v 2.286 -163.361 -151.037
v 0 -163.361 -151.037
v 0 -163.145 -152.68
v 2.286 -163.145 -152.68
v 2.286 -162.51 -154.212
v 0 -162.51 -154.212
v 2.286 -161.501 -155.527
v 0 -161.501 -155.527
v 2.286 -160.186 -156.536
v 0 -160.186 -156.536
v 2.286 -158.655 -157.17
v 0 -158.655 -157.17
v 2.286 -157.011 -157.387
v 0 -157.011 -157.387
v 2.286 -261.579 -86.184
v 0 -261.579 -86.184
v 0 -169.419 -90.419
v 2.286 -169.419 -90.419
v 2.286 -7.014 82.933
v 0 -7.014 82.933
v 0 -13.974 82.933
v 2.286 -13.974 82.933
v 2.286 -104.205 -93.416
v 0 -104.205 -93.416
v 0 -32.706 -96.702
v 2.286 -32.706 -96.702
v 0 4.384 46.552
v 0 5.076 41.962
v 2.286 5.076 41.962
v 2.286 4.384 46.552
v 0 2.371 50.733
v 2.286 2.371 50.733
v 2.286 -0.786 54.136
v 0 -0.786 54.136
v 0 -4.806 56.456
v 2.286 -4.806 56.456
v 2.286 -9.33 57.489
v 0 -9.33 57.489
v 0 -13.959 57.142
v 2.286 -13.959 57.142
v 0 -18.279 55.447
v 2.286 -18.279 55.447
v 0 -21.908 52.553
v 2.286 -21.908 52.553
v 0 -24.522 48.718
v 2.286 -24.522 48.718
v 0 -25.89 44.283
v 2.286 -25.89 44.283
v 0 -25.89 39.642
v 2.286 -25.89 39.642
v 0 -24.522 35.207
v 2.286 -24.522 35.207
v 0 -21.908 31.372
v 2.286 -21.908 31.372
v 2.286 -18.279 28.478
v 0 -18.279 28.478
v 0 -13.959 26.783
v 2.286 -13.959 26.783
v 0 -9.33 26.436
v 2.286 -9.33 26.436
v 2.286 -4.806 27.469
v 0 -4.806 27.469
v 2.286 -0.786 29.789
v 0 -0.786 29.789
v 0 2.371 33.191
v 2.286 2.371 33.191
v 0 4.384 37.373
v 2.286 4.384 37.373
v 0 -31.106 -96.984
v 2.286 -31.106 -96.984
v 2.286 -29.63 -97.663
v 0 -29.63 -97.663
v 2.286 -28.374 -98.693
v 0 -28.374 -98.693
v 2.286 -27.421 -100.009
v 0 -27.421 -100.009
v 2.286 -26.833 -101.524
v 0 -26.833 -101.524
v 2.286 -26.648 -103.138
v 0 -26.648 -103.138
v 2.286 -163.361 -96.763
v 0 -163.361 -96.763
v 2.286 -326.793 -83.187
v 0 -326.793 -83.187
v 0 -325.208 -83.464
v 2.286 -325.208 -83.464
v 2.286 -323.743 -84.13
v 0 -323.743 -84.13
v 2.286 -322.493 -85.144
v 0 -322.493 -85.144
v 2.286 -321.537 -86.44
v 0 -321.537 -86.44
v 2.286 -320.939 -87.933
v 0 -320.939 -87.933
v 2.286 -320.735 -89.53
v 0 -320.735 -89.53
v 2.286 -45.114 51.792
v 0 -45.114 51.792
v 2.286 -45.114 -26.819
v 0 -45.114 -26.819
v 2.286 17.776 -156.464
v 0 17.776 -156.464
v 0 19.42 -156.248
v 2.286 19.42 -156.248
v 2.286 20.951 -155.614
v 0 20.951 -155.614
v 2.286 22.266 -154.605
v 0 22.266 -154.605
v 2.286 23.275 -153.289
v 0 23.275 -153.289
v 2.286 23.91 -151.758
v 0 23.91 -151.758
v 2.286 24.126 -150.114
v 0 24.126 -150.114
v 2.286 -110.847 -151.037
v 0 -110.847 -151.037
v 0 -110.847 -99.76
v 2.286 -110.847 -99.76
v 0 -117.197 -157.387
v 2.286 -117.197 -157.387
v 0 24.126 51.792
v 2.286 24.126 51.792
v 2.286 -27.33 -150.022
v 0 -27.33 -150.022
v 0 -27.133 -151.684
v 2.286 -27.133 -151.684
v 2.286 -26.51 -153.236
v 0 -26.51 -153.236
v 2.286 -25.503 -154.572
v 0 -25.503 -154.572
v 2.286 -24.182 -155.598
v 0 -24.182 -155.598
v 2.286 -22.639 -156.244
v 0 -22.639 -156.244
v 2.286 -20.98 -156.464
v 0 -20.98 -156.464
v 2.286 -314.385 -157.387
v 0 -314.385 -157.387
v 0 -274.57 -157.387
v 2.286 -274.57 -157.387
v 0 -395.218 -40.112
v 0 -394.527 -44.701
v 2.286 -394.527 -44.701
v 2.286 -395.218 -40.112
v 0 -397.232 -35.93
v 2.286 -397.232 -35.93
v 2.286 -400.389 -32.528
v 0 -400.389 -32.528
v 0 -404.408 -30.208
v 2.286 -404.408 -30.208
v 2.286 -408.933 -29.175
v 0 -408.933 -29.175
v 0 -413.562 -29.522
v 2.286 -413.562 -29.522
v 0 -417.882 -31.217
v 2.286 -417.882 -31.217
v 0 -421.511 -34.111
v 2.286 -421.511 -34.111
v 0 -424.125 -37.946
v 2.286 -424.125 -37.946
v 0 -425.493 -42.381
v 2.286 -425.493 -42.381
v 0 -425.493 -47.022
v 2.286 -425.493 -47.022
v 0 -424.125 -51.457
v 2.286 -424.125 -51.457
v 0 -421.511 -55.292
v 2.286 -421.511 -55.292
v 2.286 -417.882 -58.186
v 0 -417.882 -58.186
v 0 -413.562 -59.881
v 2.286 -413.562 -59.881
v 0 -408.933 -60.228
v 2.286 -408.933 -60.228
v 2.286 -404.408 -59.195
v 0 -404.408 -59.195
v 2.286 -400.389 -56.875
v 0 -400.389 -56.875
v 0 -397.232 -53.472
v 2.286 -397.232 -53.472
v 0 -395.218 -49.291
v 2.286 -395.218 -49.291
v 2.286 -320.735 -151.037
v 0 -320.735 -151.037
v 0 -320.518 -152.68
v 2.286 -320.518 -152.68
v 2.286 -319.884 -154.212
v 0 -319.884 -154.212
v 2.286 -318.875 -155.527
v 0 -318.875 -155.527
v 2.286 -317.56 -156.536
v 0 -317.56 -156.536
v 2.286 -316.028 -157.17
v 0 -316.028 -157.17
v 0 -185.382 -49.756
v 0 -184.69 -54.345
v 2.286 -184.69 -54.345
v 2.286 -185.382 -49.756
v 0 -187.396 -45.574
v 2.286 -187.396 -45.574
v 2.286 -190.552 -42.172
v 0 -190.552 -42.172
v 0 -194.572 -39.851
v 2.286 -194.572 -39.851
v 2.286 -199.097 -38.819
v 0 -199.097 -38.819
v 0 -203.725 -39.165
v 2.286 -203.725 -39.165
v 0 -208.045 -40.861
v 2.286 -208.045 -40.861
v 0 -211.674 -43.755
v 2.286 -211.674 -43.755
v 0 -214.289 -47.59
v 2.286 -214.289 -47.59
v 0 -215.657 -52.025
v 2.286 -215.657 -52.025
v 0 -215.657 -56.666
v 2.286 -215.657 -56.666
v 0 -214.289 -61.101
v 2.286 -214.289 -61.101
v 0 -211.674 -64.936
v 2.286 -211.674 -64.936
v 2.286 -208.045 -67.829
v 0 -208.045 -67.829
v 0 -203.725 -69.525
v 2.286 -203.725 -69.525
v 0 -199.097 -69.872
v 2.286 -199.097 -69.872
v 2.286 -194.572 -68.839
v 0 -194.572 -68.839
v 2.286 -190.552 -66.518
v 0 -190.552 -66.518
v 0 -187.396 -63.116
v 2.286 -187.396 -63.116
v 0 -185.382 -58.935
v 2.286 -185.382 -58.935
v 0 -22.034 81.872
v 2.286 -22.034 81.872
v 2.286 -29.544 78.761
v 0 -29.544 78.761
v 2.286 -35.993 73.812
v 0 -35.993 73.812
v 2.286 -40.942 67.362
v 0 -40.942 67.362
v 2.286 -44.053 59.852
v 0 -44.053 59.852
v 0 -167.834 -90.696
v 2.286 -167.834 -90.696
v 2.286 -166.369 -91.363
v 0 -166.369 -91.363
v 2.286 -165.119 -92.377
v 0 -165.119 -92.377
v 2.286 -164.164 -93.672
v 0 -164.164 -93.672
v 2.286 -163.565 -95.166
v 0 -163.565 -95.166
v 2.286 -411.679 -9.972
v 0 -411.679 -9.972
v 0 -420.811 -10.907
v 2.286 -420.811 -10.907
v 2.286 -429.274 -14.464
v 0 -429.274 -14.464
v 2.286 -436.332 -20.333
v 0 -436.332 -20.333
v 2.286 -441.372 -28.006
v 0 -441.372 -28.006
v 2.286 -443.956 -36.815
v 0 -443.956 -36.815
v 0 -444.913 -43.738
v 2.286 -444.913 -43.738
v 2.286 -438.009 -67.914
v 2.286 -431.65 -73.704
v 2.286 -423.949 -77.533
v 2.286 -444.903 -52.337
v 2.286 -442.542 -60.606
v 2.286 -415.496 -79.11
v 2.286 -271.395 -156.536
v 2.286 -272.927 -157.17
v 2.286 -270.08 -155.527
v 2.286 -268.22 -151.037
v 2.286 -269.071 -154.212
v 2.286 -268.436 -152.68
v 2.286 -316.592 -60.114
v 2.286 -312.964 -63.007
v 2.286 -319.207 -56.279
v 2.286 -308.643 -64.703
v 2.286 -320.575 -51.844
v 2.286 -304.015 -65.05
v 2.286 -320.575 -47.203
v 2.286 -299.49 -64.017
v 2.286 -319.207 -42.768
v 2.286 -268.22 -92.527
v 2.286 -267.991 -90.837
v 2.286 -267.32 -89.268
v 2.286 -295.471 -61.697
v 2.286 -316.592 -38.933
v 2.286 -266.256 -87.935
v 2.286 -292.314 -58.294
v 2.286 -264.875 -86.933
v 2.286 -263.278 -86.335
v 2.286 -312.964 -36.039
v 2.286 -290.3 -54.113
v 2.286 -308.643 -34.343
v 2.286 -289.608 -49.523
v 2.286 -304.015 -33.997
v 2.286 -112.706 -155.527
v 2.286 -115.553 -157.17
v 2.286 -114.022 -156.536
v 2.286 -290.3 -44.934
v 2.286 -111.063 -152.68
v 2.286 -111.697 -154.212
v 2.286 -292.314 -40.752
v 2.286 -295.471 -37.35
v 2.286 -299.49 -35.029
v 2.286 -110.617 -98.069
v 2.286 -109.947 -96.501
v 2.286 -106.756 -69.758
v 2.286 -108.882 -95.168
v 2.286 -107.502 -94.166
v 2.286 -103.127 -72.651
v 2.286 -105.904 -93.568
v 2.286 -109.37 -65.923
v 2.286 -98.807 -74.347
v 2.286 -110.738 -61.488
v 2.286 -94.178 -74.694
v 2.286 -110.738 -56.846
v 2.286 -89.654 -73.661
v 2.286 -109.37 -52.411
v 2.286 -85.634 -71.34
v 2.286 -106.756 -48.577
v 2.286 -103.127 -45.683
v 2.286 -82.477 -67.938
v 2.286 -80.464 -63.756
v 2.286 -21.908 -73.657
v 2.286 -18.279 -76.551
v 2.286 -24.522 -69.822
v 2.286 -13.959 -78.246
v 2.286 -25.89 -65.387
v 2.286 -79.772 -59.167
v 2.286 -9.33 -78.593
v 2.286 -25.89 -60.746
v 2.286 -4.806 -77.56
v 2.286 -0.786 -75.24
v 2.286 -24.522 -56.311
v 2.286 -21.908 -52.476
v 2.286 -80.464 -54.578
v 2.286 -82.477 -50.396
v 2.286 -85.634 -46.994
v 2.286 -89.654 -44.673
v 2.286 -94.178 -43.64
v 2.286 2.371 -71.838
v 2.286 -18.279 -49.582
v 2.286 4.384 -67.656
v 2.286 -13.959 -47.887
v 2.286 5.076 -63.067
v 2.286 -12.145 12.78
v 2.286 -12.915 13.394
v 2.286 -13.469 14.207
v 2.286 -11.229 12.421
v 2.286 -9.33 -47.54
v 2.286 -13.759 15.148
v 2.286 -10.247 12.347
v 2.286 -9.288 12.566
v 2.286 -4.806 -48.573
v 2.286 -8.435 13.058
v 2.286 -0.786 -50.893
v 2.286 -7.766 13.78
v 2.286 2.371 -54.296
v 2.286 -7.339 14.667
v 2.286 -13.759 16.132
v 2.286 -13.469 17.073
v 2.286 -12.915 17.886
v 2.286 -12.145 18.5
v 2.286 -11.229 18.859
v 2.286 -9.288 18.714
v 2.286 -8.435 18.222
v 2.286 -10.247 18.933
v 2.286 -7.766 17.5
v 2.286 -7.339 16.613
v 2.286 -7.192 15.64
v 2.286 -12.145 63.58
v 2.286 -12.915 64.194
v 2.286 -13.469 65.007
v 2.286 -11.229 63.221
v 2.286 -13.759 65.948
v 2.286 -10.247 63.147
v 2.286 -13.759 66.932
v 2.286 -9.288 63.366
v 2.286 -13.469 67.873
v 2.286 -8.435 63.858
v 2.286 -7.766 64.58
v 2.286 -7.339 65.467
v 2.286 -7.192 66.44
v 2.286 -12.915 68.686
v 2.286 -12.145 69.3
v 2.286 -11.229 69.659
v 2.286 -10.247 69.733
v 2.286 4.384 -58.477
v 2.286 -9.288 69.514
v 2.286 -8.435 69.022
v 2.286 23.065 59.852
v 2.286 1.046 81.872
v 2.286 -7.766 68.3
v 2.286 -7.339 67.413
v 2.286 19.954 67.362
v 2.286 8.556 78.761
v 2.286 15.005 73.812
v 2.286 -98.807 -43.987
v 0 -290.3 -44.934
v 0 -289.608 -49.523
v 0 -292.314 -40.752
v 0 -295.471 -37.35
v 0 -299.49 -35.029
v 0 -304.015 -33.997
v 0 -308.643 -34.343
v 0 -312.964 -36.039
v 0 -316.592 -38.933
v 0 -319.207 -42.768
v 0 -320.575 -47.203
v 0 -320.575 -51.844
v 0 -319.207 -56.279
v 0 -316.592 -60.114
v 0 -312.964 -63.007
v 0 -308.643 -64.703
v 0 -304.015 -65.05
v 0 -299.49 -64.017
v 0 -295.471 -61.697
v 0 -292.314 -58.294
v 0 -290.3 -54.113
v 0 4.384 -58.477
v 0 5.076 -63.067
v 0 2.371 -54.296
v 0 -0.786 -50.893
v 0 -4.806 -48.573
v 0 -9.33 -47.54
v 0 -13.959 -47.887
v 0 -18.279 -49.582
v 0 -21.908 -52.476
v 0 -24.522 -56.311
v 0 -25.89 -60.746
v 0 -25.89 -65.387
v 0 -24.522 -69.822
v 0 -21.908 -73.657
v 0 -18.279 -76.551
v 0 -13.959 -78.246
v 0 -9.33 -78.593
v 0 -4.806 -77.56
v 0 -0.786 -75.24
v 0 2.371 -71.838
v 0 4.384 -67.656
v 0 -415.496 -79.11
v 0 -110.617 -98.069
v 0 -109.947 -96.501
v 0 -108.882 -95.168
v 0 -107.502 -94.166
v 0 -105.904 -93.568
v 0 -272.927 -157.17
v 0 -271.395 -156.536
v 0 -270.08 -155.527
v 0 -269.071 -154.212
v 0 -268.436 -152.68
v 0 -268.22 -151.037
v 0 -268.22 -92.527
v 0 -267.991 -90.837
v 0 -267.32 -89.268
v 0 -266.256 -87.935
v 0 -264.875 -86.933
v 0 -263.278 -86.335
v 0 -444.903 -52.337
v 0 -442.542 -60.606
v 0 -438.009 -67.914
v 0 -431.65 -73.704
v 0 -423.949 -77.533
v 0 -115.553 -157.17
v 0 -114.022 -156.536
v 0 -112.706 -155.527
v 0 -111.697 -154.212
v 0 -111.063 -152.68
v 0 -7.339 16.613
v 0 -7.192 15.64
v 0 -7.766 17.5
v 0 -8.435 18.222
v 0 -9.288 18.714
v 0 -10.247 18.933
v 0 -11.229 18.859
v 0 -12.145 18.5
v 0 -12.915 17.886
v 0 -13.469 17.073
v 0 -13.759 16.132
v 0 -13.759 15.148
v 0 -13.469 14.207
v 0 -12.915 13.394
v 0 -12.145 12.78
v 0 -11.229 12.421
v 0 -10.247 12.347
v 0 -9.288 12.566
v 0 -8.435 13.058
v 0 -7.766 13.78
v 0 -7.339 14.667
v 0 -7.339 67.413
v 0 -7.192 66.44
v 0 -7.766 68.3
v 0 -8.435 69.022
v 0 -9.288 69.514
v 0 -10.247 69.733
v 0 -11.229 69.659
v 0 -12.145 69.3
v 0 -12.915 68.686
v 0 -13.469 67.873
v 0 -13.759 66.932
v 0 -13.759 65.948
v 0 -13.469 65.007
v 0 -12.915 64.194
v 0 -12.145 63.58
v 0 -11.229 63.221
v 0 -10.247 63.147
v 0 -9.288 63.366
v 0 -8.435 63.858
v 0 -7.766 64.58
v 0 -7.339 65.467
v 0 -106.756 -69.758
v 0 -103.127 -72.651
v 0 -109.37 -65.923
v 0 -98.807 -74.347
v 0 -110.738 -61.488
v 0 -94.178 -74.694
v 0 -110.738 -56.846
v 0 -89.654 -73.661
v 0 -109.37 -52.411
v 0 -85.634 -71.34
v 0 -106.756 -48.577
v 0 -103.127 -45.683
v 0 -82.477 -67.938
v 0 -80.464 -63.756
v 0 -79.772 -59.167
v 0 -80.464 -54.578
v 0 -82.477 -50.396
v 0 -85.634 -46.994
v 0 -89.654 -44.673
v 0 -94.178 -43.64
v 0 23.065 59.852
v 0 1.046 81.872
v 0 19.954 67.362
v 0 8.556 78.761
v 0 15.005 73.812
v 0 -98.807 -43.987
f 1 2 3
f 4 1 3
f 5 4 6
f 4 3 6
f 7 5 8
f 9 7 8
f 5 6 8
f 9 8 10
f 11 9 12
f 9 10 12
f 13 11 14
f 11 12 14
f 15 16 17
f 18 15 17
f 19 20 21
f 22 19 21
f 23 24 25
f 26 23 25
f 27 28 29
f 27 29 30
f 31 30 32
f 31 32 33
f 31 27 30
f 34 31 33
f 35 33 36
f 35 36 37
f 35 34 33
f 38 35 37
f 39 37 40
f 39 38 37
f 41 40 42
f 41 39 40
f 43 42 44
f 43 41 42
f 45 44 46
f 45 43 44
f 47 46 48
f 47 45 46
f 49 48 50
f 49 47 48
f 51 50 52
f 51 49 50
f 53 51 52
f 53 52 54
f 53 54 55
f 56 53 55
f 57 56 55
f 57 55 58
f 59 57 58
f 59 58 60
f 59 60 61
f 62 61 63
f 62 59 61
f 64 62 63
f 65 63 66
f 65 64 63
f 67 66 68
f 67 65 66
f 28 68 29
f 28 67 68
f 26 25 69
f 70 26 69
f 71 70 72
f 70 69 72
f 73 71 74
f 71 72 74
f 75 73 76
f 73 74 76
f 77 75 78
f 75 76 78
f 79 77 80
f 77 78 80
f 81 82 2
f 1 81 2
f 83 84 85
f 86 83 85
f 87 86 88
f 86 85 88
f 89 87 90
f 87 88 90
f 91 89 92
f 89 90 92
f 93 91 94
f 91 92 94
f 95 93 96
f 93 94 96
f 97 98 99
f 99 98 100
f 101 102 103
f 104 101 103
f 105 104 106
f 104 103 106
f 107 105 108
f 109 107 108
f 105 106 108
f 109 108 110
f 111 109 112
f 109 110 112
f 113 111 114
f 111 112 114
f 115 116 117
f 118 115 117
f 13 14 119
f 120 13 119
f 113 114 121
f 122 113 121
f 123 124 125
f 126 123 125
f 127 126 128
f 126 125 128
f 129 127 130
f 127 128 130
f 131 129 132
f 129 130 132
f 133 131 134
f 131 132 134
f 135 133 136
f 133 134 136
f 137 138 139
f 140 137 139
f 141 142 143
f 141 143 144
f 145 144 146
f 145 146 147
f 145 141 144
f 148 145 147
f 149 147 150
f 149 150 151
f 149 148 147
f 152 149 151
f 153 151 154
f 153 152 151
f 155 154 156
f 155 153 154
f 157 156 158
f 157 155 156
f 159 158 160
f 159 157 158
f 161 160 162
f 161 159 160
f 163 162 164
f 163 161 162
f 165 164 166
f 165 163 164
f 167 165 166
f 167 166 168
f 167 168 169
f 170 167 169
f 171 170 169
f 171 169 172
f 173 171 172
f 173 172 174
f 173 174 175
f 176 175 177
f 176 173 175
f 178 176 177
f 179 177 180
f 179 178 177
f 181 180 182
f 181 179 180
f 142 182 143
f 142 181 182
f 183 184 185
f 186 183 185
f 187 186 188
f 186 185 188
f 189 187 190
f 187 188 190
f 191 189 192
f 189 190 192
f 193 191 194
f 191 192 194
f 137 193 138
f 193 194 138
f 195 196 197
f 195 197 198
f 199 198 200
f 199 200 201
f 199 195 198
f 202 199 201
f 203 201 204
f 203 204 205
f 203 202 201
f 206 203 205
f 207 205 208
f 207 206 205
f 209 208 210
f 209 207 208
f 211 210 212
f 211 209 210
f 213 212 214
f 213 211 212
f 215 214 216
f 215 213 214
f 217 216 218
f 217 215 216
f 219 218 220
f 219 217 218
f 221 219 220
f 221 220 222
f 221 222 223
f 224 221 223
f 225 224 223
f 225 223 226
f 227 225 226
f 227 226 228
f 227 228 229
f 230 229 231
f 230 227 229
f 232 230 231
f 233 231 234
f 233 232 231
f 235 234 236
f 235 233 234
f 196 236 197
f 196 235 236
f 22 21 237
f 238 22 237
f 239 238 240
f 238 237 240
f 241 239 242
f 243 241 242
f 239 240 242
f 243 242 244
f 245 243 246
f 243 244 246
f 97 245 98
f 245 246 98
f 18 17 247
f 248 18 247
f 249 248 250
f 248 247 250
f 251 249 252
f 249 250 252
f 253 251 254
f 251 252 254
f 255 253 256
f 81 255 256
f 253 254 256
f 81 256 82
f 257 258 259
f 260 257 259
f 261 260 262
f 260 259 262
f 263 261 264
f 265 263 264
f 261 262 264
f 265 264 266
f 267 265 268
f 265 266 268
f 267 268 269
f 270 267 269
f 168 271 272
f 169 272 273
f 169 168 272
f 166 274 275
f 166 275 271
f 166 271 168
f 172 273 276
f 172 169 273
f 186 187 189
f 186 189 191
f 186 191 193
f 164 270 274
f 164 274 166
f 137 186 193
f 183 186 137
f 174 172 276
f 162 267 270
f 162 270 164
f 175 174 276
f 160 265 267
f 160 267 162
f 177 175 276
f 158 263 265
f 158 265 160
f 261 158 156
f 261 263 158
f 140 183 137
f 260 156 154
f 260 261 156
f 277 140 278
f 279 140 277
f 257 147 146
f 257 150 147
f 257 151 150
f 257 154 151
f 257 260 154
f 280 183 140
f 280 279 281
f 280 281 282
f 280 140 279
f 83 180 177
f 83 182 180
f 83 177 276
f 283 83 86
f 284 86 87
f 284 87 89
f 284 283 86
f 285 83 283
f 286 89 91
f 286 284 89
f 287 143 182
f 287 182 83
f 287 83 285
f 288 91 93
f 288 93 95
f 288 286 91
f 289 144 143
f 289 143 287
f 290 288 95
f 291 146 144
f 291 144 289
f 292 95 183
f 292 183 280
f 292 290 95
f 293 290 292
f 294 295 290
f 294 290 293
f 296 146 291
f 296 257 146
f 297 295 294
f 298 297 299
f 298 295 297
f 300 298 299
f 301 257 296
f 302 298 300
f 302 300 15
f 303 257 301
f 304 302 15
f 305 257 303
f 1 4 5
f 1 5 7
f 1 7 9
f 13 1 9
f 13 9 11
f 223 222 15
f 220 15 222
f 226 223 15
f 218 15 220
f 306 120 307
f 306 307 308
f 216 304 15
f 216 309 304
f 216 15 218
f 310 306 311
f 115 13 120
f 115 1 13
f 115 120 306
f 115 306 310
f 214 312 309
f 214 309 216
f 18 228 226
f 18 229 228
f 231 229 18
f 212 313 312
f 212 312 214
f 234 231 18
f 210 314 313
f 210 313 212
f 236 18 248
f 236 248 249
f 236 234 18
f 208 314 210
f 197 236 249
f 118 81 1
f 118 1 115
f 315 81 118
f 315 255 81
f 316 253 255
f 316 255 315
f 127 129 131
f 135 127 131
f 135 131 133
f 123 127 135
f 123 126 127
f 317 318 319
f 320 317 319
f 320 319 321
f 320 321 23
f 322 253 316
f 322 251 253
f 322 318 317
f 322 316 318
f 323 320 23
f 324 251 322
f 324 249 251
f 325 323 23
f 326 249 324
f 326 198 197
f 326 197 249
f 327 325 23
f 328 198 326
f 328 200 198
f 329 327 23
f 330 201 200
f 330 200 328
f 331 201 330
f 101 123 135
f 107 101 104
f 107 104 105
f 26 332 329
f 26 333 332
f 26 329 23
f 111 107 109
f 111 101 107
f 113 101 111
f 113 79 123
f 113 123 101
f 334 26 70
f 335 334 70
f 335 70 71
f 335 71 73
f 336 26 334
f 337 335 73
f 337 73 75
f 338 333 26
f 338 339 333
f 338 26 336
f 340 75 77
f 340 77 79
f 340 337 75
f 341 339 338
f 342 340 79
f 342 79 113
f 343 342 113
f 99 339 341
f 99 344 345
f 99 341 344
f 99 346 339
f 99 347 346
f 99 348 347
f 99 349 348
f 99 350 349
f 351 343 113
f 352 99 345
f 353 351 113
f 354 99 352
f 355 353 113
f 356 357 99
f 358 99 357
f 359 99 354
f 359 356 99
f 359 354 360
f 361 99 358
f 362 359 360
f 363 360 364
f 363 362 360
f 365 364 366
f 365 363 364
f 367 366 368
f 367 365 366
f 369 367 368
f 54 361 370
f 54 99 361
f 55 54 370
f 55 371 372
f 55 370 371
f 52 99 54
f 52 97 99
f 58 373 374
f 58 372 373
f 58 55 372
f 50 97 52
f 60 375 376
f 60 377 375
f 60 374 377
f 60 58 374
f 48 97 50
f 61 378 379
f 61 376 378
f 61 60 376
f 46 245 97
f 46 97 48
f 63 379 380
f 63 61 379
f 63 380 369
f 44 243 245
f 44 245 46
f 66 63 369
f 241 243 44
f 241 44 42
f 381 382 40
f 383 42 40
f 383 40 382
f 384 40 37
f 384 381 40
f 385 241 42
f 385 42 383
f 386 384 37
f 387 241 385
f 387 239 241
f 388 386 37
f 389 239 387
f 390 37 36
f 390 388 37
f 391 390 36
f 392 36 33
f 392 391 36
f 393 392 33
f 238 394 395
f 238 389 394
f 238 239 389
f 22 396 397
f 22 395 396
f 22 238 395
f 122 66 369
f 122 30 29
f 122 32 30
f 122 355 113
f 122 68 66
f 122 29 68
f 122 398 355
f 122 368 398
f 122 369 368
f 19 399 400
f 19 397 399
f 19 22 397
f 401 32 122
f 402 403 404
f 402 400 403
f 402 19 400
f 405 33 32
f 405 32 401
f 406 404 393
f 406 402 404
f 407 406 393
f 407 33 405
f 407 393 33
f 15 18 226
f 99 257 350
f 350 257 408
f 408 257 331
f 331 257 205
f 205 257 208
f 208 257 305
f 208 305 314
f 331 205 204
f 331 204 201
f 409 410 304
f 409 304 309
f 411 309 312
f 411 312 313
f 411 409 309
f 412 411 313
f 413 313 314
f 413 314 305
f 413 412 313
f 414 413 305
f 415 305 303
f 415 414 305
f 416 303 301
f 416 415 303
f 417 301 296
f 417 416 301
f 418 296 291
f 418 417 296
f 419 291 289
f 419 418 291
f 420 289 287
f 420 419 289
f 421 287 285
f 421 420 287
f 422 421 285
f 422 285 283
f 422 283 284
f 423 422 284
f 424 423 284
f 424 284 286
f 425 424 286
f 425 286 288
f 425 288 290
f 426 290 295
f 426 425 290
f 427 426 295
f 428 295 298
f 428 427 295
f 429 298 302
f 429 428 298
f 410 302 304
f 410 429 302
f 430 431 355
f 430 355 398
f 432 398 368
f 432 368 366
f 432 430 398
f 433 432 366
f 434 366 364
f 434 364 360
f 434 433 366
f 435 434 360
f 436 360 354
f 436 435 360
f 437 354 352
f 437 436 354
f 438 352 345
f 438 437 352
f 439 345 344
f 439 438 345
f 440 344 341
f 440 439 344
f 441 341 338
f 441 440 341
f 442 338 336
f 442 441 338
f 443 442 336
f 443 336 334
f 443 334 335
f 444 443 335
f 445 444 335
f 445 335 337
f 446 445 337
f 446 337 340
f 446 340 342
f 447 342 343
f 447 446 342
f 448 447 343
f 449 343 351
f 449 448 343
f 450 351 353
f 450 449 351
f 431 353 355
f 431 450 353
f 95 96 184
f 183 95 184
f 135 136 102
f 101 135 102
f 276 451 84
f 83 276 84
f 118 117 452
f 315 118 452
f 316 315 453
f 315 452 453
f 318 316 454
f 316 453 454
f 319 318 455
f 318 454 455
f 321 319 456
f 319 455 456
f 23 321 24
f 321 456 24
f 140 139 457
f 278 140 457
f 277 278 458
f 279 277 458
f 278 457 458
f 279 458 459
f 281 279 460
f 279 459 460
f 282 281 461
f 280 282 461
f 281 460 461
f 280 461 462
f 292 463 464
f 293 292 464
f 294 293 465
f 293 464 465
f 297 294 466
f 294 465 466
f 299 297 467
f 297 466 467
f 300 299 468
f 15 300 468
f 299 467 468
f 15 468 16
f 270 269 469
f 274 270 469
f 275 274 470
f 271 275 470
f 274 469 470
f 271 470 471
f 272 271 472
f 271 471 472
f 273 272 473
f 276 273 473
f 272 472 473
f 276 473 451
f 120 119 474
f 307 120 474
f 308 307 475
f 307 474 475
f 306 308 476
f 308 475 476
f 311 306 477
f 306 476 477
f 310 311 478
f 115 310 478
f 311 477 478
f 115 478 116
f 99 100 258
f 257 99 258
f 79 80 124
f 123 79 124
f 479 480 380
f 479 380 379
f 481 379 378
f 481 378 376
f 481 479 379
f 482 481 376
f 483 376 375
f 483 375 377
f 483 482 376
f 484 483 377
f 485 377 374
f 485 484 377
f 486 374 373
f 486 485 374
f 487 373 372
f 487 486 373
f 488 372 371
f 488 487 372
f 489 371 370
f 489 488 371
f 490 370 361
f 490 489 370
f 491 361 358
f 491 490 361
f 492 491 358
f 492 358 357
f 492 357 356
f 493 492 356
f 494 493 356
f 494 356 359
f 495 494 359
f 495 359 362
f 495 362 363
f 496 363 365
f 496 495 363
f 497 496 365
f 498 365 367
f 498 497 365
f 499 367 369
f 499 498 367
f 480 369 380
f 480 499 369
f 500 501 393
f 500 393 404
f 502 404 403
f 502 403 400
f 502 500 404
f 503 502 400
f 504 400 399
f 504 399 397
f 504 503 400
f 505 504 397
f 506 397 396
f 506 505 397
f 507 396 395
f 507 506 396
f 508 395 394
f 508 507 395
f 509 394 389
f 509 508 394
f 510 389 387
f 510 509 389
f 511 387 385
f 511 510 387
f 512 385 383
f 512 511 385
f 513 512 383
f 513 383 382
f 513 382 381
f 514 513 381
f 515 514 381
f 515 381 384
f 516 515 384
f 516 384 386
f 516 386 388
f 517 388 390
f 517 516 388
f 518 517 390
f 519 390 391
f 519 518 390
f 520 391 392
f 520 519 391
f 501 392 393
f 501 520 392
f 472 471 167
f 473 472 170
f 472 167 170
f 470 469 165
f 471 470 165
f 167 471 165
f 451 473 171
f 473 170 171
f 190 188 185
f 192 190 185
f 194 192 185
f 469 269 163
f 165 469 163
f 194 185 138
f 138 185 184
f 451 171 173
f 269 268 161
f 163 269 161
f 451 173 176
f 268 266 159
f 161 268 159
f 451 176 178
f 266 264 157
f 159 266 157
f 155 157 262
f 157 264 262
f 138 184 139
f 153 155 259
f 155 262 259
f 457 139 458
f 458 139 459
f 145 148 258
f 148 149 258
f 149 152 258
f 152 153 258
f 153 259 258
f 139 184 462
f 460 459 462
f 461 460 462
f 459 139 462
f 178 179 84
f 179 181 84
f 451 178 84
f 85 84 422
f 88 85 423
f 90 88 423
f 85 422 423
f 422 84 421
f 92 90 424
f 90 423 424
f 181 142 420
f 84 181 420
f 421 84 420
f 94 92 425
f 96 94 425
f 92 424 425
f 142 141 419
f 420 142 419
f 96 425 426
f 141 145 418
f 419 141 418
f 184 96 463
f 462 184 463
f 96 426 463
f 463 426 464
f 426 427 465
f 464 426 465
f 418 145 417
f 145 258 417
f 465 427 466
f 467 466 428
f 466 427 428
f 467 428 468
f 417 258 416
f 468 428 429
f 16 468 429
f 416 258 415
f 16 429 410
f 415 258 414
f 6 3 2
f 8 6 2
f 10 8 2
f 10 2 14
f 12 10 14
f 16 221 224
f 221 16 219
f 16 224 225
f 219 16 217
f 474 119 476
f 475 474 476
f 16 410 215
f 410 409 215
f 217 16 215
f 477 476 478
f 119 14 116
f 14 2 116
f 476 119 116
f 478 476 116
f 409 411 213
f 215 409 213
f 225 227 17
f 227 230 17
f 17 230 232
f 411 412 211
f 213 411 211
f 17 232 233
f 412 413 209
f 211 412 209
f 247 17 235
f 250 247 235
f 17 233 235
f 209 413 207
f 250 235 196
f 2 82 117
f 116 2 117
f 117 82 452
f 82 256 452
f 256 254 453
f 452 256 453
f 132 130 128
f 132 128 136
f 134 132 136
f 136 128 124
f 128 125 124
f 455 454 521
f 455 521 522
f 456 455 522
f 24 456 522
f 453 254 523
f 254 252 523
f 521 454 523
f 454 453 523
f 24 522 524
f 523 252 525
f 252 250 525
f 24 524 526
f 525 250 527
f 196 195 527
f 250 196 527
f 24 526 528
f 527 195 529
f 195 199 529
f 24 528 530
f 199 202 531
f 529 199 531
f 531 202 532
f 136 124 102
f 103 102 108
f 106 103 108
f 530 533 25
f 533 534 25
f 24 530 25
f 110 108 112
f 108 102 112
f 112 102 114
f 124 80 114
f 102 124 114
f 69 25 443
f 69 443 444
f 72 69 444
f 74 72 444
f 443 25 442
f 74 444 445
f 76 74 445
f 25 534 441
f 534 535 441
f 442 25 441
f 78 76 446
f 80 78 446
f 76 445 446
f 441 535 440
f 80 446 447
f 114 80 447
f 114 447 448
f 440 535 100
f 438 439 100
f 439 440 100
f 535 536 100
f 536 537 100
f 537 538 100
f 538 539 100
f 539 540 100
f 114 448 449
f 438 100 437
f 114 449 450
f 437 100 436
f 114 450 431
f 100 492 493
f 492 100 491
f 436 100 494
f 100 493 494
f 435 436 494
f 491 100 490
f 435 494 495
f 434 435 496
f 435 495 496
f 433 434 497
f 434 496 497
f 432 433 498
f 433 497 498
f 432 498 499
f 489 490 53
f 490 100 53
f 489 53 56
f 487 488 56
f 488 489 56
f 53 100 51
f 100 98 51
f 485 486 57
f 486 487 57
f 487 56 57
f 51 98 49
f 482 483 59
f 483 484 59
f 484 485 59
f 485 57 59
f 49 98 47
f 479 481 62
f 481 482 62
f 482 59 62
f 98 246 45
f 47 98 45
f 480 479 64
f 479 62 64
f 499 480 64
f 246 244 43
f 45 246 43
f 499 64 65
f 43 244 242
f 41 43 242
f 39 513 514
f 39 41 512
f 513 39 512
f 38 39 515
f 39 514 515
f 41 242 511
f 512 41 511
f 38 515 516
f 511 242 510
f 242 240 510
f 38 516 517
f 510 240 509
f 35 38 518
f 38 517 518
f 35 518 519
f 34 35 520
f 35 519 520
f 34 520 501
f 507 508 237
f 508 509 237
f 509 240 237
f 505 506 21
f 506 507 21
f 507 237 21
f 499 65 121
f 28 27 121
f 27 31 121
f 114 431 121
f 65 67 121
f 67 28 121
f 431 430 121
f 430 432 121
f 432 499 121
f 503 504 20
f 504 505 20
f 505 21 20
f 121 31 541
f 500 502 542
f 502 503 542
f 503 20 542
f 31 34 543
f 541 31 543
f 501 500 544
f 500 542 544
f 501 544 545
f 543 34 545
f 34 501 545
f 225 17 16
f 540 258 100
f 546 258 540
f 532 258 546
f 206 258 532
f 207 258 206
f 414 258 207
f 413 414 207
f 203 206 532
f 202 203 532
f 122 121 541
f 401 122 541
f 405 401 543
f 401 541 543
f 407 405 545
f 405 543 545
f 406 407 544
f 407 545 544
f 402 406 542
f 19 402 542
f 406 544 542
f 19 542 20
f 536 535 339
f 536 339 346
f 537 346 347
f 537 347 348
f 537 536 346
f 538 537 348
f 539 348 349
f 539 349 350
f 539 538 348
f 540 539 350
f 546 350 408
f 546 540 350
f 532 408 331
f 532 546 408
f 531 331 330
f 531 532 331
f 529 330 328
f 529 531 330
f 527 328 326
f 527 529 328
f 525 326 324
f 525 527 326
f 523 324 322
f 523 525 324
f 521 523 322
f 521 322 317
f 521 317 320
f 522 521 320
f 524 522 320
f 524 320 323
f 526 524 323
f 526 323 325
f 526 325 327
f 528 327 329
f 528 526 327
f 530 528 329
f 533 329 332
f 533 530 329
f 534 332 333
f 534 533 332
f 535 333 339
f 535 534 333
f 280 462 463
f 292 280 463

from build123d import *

# Parameters (mm, degrees)
F0_R     = 15.5702
F0_R_2   = 3.302
F1_DEPTH = 2.286


# Not quite as in the source:
# - a feature names something its author has since deleted; it is built from what else it names


with BuildPart() as f1:
    # F0 (on Right) → F1 (new body)
    with BuildSketch(Plane.YZ):
        with BuildLine():
            Line((-45.1142073236, -26.818738899), (-411.6793204181, -9.9719436831))
            ThreePointArc((-411.6793204181, -9.9719436831), (-433.0208080629, -17.1370033148), (-443.9559804746, -36.8148888401))
            Line((-443.9559804746, -36.8148888401), (-444.9130844184, -43.7378478567))
            ThreePointArc((-444.9130844184, -43.7378478567), (-438.0085876413, -67.9142971029), (-415.4957405146, -79.1100323691))
            Line((-415.4957405146, -79.1100323691), (-326.7930180723, -83.186679455))
            ThreePointArc((-326.7930180723, -83.186679455), (-322.4925045261, -85.1441378233), (-320.7345470438, -89.5299838666))
            Line((-320.7345470438, -89.5299838666), (-320.7345470438, -151.0368096017))
            ThreePointArc((-320.7345470438, -151.0368096017), (-318.8746751043, -155.5269376622), (-314.3845470438, -157.3868096017))
            Line((-314.3845470438, -157.3868096017), (-274.5700470438, -157.3868096017))
            ThreePointArc((-274.5700470438, -157.3868096017), (-270.0799189833, -155.5269376622), (-268.2200470438, -151.0368096017))
            Line((-268.2200470438, -151.0368096017), (-268.2200470438, -92.5271466826))
            ThreePointArc((-268.2200470438, -92.5271466826), (-266.2558930871, -87.9351041649), (-261.5785180723, -86.183842271))
            Line((-261.5785180723, -86.183842271), (-169.4194716536, -90.4193369398))
            ThreePointArc((-169.4194716536, -90.4193369398), (-165.1189581074, -92.3767953082), (-163.3610006251, -96.7626413515))
            Line((-163.3610006251, -96.7626413515), (-163.3610006251, -151.0368096017))
            ThreePointArc((-163.3610006251, -151.0368096017), (-161.5011286857, -155.5269376622), (-157.0110006251, -157.3868096017))
            Line((-157.0110006251, -157.3868096017), (-117.1965006251, -157.3868096017))
            ThreePointArc((-117.1965006251, -157.3868096017), (-112.7063725646, -155.5269376622), (-110.8465006251, -151.0368096017))
            Line((-110.8465006251, -151.0368096017), (-110.8465006251, -99.7598041674))
            ThreePointArc((-110.8465006251, -99.7598041674), (-108.8823466684, -95.1677616497), (-104.2049716536, -93.4164997558))
            Line((-104.2049716536, -93.4164997558), (-32.7059788978, -96.7024886458))
            ThreePointArc((-32.7059788978, -96.7024886458), (-28.3737210787, -98.6934263777), (-26.6481782752, -103.1380627967))
            Line((-26.6481782752, -103.1380627967), (-27.3295071805, -150.0221421965))
            ThreePointArc((-27.3295071805, -150.0221421965), (-25.5028102734, -154.5717983424), (-20.9801775863, -156.4644119358))
            Line((-20.9801775863, -156.4644119358), (17.7761926764, -156.4644119358))
            ThreePointArc((17.7761926764, -156.4644119358), (22.266320737, -154.6045399963), (24.1261926764, -150.1144119358))
            Line((24.1261926764, -150.1144119358), (24.1261926764, -99.3144119358))
            Line((24.1261926764, -99.3144119358), (24.1261926764, -36.0657921419))
            ThreePointArc((24.1261926764, -36.0657921419), (22.3682351942, -31.6799460986), (18.0677216479, -29.7224877302))
            Line((18.0677216479, -29.7224877302), (-45.1142073236, -26.818738899))
        make_face()
        with Locations((-410.0968120394, -44.7014163277)):
            Circle(F0_R, mode=Mode.SUBTRACT)
        with Locations((-305.1785570708, -49.5233055166)):
            Circle(F0_R, mode=Mode.SUBTRACT)
        with Locations((-200.2603021023, -54.3451947055)):
            Circle(F0_R, mode=Mode.SUBTRACT)
        with Locations((-95.3420471337, -59.1670838944)):
            Circle(F0_R, mode=Mode.SUBTRACT)
        with Locations((-10.4940073236, -63.0665754174)):
            Circle(F0_R, mode=Mode.SUBTRACT)
        with BuildLine():
            Line((-45.1142073236, 51.7922245826), (-45.1142073236, -26.818738899))
            Line((-45.1142073236, -26.818738899), (18.0677216479, -29.7224877302))
            Line((18.0677216479, -29.7224877302), (24.1261926764, -30.000926177))
            Line((24.1261926764, -30.000926177), (24.1261926764, 51.7922245826))
            ThreePointArc((24.1261926764, 51.7922245826), (15.0053806853, 73.8118125915), (-7.0142073236, 82.9326245826))
            Line((-7.0142073236, 82.9326245826), (-13.9738073236, 82.9326245826))
            ThreePointArc((-13.9738073236, 82.9326245826), (-35.9933953324, 73.8118125915), (-45.1142073236, 51.7922245826))
        make_face()
        with Locations((-10.4940073236, 15.6400269167)):
            Circle(F0_R_2, mode=Mode.SUBTRACT)
        with Locations((-10.4940073236, 41.9624245826)):
            Circle(F0_R, mode=Mode.SUBTRACT)
        with Locations((-10.4940073236, 66.4400269167)):
            Circle(F0_R_2, mode=Mode.SUBTRACT)
        with BuildLine():
            Line((24.1261926764, -30.000926177), (18.0677216479, -29.7224877302))
            ThreePointArc((18.0677216479, -29.7224877302), (22.3682351942, -31.6799460986), (24.1261926764, -36.0657921419))
            Line((24.1261926764, -36.0657921419), (24.1261926764, -30.000926177))
        make_face()
    extrude(amount=F1_DEPTH)


solid = f1.part
